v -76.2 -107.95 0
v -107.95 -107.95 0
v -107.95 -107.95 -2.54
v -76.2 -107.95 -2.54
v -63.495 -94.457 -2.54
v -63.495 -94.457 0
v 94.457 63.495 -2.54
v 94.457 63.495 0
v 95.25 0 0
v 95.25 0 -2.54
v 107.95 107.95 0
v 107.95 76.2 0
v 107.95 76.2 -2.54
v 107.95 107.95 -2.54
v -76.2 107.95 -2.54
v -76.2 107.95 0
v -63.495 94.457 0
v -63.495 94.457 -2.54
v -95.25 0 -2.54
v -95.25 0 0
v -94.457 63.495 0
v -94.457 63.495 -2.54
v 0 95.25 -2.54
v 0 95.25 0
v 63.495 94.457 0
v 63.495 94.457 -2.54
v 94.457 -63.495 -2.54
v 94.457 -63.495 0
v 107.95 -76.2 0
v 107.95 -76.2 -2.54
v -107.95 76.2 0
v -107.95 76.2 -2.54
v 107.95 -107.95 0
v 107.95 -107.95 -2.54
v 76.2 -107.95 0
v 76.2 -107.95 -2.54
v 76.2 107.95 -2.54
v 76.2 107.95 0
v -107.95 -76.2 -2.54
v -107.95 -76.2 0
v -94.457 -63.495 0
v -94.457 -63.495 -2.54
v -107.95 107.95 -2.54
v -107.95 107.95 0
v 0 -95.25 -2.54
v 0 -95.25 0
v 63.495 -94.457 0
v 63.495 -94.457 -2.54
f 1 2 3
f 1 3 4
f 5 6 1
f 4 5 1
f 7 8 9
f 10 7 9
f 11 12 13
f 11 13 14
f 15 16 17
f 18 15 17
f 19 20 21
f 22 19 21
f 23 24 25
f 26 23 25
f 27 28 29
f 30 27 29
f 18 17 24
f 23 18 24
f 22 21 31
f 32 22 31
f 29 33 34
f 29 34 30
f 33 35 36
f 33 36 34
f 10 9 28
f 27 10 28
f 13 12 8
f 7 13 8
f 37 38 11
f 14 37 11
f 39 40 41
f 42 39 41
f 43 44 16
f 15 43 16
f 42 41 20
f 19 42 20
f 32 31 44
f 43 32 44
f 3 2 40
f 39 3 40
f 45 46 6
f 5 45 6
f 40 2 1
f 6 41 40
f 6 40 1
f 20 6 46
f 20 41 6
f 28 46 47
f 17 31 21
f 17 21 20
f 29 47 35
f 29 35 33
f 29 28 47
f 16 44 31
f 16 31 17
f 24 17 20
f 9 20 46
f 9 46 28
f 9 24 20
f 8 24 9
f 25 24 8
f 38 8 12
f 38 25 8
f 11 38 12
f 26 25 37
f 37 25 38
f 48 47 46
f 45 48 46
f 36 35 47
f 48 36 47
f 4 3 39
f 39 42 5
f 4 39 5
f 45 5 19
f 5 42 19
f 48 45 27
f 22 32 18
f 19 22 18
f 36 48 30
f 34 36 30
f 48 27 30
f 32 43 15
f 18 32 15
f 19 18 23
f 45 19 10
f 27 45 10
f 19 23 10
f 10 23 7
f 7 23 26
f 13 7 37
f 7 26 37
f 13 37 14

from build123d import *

# Parameters (mm, degrees)
F0_W     = 215.9
F0_H     = 215.9
F1_DEPTH = 2.54
F3_DEPTH = 12.7
F6_COUNT = 4
F6_ANGLE = 270
F7_DEPTH = 25.401


with BuildPart() as f1:
    # F0 (on Top) → F1 (new body)
    with BuildSketch(Plane.XY):
        Rectangle(F0_W, F0_H)
    extrude(amount=-F1_DEPTH)


with BuildPart() as f3:
    # F2 (on face) → F3 (new body, symmetric)
    with BuildSketch(Plane.XY):
        Polygon((-76.2, -107.95), (0, -107.95), (0, -95.25), (-63.4950530427, -94.4573846459), align=None)
    extrude(amount=F3_DEPTH, both=True)


with BuildPart() as f4_1:
    # F4: instance of F3
    add(f3.part.mirror(Plane.YZ))


with BuildPart() as f6_1:
    # F6: instance of F3
    add(f3.part.rotate(Axis((0, 0, 47.5433133543), (0, 0, 1)), 1 * F6_ANGLE / (F6_COUNT - 1)))


with BuildPart() as f6_2:
    # F6: instance of F3
    add(f3.part.rotate(Axis((0, 0, 47.5433133543), (0, 0, 1)), 2 * F6_ANGLE / (F6_COUNT - 1)))


with BuildPart() as f6_3:
    # F6: instance of F3
    add(f3.part.rotate(Axis((0, 0, 47.5433133543), (0, 0, 1)), 3 * F6_ANGLE / (F6_COUNT - 1)))


with BuildPart() as f6_4:
    # F6: instance of F4_1
    add(f4_1.part.rotate(Axis((0, 0, 47.5433133543), (0, 0, 1)), 1 * F6_ANGLE / (F6_COUNT - 1)))


with BuildPart() as f6_5:
    # F6: instance of F4_1
    add(f4_1.part.rotate(Axis((0, 0, 47.5433133543), (0, 0, 1)), 2 * F6_ANGLE / (F6_COUNT - 1)))


with BuildPart() as f6_6:
    # F6: instance of F4_1
    add(f4_1.part.rotate(Axis((0, 0, 47.5433133543), (0, 0, 1)), 3 * F6_ANGLE / (F6_COUNT - 1)))


with BuildPart() as f7_tool:
    # F6_face (on face) + F4_face (on face) + F3_face (on face) → F7 (new body, through all)
    with BuildSketch(Plane(origin=(-35.4001438313, 101.5916492403, 12.7), x_dir=(1, 0, 0), z_dir=(0, 0, 1))):
        Polygon((-40.7998561687, 6.3583507597), (-28.0949092115, -7.1342645945), (35.4001438313, -6.3416492403), (35.4001438313, 6.3583507597), align=None)
        Polygon((98.895196874, -7.1342645945), (111.6001438313, 6.3583507597), (35.4001438313, 6.3583507597), (35.4001438313, -6.3416492403), align=None)
        Polygon((143.3501438313, -25.3916492403), (129.8575284771, -38.0965961976), (130.6501438313, -101.5916492403), (143.3501438313, -101.5916492403), align=None)
        Polygon((129.8575284771, -165.0867022831), (143.3501438313, -177.7916492403), (143.3501438313, -101.5916492403), (130.6501438313, -101.5916492403), align=None)
        Polygon((-72.5498561687, -177.7916492403), (-59.0572408146, -165.0867022831), (-59.8498561687, -101.5916492403), (-72.5498561687, -101.5916492403), align=None)
        Polygon((-59.0572408146, -38.0965961976), (-72.5498561687, -25.3916492403), (-72.5498561687, -101.5916492403), (-59.8498561687, -101.5916492403), align=None)
    with BuildSketch(Plane(origin=(35.4001438313, -101.5916492403, 12.7), x_dir=(1, 0, 0), z_dir=(0, 0, 1))):
        Polygon((40.7998561687, -6.3583507597), (28.0949092115, 7.1342645945), (-35.4001438313, 6.3416492403), (-35.4001438313, -6.3583507597), align=None)
    with BuildSketch(Plane(origin=(-35.4001438313, -101.5916492403, 12.7), x_dir=(1, 0, 0), z_dir=(0, 0, 1))):
        Polygon((-28.0949092115, 7.1342645945), (-40.7998561687, -6.3583507597), (35.4001438313, -6.3583507597), (35.4001438313, 6.3416492403), align=None)
    extrude(amount=-F7_DEPTH)


with BuildPart() as f1_1:
    add(f1.part)

    # F7: cut by f7_tool
    add(f7_tool.part, mode=Mode.SUBTRACT)


with BuildPart() as f3_1:
    add(f3.part)

    # F7: cut by f7_tool
    add(f7_tool.part, mode=Mode.SUBTRACT)


with BuildPart() as f4_1_1:
    add(f4_1.part)

    # F7: cut by f7_tool
    add(f7_tool.part, mode=Mode.SUBTRACT)


with BuildPart() as f6_1_1:
    add(f6_1.part)

    # F7: cut by f7_tool
    add(f7_tool.part, mode=Mode.SUBTRACT)


with BuildPart() as f6_2_1:
    add(f6_2.part)

    # F7: cut by f7_tool
    add(f7_tool.part, mode=Mode.SUBTRACT)


with BuildPart() as f6_3_1:
    add(f6_3.part)

    # F7: cut by f7_tool
    add(f7_tool.part, mode=Mode.SUBTRACT)


with BuildPart() as f6_4_1:
    add(f6_4.part)

    # F7: cut by f7_tool
    add(f7_tool.part, mode=Mode.SUBTRACT)


with BuildPart() as f6_5_1:
    add(f6_5.part)

    # F7: cut by f7_tool
    add(f7_tool.part, mode=Mode.SUBTRACT)


with BuildPart() as f6_6_1:
    add(f6_6.part)

    # F7: cut by f7_tool
    add(f7_tool.part, mode=Mode.SUBTRACT)


solid = f1_1.part
